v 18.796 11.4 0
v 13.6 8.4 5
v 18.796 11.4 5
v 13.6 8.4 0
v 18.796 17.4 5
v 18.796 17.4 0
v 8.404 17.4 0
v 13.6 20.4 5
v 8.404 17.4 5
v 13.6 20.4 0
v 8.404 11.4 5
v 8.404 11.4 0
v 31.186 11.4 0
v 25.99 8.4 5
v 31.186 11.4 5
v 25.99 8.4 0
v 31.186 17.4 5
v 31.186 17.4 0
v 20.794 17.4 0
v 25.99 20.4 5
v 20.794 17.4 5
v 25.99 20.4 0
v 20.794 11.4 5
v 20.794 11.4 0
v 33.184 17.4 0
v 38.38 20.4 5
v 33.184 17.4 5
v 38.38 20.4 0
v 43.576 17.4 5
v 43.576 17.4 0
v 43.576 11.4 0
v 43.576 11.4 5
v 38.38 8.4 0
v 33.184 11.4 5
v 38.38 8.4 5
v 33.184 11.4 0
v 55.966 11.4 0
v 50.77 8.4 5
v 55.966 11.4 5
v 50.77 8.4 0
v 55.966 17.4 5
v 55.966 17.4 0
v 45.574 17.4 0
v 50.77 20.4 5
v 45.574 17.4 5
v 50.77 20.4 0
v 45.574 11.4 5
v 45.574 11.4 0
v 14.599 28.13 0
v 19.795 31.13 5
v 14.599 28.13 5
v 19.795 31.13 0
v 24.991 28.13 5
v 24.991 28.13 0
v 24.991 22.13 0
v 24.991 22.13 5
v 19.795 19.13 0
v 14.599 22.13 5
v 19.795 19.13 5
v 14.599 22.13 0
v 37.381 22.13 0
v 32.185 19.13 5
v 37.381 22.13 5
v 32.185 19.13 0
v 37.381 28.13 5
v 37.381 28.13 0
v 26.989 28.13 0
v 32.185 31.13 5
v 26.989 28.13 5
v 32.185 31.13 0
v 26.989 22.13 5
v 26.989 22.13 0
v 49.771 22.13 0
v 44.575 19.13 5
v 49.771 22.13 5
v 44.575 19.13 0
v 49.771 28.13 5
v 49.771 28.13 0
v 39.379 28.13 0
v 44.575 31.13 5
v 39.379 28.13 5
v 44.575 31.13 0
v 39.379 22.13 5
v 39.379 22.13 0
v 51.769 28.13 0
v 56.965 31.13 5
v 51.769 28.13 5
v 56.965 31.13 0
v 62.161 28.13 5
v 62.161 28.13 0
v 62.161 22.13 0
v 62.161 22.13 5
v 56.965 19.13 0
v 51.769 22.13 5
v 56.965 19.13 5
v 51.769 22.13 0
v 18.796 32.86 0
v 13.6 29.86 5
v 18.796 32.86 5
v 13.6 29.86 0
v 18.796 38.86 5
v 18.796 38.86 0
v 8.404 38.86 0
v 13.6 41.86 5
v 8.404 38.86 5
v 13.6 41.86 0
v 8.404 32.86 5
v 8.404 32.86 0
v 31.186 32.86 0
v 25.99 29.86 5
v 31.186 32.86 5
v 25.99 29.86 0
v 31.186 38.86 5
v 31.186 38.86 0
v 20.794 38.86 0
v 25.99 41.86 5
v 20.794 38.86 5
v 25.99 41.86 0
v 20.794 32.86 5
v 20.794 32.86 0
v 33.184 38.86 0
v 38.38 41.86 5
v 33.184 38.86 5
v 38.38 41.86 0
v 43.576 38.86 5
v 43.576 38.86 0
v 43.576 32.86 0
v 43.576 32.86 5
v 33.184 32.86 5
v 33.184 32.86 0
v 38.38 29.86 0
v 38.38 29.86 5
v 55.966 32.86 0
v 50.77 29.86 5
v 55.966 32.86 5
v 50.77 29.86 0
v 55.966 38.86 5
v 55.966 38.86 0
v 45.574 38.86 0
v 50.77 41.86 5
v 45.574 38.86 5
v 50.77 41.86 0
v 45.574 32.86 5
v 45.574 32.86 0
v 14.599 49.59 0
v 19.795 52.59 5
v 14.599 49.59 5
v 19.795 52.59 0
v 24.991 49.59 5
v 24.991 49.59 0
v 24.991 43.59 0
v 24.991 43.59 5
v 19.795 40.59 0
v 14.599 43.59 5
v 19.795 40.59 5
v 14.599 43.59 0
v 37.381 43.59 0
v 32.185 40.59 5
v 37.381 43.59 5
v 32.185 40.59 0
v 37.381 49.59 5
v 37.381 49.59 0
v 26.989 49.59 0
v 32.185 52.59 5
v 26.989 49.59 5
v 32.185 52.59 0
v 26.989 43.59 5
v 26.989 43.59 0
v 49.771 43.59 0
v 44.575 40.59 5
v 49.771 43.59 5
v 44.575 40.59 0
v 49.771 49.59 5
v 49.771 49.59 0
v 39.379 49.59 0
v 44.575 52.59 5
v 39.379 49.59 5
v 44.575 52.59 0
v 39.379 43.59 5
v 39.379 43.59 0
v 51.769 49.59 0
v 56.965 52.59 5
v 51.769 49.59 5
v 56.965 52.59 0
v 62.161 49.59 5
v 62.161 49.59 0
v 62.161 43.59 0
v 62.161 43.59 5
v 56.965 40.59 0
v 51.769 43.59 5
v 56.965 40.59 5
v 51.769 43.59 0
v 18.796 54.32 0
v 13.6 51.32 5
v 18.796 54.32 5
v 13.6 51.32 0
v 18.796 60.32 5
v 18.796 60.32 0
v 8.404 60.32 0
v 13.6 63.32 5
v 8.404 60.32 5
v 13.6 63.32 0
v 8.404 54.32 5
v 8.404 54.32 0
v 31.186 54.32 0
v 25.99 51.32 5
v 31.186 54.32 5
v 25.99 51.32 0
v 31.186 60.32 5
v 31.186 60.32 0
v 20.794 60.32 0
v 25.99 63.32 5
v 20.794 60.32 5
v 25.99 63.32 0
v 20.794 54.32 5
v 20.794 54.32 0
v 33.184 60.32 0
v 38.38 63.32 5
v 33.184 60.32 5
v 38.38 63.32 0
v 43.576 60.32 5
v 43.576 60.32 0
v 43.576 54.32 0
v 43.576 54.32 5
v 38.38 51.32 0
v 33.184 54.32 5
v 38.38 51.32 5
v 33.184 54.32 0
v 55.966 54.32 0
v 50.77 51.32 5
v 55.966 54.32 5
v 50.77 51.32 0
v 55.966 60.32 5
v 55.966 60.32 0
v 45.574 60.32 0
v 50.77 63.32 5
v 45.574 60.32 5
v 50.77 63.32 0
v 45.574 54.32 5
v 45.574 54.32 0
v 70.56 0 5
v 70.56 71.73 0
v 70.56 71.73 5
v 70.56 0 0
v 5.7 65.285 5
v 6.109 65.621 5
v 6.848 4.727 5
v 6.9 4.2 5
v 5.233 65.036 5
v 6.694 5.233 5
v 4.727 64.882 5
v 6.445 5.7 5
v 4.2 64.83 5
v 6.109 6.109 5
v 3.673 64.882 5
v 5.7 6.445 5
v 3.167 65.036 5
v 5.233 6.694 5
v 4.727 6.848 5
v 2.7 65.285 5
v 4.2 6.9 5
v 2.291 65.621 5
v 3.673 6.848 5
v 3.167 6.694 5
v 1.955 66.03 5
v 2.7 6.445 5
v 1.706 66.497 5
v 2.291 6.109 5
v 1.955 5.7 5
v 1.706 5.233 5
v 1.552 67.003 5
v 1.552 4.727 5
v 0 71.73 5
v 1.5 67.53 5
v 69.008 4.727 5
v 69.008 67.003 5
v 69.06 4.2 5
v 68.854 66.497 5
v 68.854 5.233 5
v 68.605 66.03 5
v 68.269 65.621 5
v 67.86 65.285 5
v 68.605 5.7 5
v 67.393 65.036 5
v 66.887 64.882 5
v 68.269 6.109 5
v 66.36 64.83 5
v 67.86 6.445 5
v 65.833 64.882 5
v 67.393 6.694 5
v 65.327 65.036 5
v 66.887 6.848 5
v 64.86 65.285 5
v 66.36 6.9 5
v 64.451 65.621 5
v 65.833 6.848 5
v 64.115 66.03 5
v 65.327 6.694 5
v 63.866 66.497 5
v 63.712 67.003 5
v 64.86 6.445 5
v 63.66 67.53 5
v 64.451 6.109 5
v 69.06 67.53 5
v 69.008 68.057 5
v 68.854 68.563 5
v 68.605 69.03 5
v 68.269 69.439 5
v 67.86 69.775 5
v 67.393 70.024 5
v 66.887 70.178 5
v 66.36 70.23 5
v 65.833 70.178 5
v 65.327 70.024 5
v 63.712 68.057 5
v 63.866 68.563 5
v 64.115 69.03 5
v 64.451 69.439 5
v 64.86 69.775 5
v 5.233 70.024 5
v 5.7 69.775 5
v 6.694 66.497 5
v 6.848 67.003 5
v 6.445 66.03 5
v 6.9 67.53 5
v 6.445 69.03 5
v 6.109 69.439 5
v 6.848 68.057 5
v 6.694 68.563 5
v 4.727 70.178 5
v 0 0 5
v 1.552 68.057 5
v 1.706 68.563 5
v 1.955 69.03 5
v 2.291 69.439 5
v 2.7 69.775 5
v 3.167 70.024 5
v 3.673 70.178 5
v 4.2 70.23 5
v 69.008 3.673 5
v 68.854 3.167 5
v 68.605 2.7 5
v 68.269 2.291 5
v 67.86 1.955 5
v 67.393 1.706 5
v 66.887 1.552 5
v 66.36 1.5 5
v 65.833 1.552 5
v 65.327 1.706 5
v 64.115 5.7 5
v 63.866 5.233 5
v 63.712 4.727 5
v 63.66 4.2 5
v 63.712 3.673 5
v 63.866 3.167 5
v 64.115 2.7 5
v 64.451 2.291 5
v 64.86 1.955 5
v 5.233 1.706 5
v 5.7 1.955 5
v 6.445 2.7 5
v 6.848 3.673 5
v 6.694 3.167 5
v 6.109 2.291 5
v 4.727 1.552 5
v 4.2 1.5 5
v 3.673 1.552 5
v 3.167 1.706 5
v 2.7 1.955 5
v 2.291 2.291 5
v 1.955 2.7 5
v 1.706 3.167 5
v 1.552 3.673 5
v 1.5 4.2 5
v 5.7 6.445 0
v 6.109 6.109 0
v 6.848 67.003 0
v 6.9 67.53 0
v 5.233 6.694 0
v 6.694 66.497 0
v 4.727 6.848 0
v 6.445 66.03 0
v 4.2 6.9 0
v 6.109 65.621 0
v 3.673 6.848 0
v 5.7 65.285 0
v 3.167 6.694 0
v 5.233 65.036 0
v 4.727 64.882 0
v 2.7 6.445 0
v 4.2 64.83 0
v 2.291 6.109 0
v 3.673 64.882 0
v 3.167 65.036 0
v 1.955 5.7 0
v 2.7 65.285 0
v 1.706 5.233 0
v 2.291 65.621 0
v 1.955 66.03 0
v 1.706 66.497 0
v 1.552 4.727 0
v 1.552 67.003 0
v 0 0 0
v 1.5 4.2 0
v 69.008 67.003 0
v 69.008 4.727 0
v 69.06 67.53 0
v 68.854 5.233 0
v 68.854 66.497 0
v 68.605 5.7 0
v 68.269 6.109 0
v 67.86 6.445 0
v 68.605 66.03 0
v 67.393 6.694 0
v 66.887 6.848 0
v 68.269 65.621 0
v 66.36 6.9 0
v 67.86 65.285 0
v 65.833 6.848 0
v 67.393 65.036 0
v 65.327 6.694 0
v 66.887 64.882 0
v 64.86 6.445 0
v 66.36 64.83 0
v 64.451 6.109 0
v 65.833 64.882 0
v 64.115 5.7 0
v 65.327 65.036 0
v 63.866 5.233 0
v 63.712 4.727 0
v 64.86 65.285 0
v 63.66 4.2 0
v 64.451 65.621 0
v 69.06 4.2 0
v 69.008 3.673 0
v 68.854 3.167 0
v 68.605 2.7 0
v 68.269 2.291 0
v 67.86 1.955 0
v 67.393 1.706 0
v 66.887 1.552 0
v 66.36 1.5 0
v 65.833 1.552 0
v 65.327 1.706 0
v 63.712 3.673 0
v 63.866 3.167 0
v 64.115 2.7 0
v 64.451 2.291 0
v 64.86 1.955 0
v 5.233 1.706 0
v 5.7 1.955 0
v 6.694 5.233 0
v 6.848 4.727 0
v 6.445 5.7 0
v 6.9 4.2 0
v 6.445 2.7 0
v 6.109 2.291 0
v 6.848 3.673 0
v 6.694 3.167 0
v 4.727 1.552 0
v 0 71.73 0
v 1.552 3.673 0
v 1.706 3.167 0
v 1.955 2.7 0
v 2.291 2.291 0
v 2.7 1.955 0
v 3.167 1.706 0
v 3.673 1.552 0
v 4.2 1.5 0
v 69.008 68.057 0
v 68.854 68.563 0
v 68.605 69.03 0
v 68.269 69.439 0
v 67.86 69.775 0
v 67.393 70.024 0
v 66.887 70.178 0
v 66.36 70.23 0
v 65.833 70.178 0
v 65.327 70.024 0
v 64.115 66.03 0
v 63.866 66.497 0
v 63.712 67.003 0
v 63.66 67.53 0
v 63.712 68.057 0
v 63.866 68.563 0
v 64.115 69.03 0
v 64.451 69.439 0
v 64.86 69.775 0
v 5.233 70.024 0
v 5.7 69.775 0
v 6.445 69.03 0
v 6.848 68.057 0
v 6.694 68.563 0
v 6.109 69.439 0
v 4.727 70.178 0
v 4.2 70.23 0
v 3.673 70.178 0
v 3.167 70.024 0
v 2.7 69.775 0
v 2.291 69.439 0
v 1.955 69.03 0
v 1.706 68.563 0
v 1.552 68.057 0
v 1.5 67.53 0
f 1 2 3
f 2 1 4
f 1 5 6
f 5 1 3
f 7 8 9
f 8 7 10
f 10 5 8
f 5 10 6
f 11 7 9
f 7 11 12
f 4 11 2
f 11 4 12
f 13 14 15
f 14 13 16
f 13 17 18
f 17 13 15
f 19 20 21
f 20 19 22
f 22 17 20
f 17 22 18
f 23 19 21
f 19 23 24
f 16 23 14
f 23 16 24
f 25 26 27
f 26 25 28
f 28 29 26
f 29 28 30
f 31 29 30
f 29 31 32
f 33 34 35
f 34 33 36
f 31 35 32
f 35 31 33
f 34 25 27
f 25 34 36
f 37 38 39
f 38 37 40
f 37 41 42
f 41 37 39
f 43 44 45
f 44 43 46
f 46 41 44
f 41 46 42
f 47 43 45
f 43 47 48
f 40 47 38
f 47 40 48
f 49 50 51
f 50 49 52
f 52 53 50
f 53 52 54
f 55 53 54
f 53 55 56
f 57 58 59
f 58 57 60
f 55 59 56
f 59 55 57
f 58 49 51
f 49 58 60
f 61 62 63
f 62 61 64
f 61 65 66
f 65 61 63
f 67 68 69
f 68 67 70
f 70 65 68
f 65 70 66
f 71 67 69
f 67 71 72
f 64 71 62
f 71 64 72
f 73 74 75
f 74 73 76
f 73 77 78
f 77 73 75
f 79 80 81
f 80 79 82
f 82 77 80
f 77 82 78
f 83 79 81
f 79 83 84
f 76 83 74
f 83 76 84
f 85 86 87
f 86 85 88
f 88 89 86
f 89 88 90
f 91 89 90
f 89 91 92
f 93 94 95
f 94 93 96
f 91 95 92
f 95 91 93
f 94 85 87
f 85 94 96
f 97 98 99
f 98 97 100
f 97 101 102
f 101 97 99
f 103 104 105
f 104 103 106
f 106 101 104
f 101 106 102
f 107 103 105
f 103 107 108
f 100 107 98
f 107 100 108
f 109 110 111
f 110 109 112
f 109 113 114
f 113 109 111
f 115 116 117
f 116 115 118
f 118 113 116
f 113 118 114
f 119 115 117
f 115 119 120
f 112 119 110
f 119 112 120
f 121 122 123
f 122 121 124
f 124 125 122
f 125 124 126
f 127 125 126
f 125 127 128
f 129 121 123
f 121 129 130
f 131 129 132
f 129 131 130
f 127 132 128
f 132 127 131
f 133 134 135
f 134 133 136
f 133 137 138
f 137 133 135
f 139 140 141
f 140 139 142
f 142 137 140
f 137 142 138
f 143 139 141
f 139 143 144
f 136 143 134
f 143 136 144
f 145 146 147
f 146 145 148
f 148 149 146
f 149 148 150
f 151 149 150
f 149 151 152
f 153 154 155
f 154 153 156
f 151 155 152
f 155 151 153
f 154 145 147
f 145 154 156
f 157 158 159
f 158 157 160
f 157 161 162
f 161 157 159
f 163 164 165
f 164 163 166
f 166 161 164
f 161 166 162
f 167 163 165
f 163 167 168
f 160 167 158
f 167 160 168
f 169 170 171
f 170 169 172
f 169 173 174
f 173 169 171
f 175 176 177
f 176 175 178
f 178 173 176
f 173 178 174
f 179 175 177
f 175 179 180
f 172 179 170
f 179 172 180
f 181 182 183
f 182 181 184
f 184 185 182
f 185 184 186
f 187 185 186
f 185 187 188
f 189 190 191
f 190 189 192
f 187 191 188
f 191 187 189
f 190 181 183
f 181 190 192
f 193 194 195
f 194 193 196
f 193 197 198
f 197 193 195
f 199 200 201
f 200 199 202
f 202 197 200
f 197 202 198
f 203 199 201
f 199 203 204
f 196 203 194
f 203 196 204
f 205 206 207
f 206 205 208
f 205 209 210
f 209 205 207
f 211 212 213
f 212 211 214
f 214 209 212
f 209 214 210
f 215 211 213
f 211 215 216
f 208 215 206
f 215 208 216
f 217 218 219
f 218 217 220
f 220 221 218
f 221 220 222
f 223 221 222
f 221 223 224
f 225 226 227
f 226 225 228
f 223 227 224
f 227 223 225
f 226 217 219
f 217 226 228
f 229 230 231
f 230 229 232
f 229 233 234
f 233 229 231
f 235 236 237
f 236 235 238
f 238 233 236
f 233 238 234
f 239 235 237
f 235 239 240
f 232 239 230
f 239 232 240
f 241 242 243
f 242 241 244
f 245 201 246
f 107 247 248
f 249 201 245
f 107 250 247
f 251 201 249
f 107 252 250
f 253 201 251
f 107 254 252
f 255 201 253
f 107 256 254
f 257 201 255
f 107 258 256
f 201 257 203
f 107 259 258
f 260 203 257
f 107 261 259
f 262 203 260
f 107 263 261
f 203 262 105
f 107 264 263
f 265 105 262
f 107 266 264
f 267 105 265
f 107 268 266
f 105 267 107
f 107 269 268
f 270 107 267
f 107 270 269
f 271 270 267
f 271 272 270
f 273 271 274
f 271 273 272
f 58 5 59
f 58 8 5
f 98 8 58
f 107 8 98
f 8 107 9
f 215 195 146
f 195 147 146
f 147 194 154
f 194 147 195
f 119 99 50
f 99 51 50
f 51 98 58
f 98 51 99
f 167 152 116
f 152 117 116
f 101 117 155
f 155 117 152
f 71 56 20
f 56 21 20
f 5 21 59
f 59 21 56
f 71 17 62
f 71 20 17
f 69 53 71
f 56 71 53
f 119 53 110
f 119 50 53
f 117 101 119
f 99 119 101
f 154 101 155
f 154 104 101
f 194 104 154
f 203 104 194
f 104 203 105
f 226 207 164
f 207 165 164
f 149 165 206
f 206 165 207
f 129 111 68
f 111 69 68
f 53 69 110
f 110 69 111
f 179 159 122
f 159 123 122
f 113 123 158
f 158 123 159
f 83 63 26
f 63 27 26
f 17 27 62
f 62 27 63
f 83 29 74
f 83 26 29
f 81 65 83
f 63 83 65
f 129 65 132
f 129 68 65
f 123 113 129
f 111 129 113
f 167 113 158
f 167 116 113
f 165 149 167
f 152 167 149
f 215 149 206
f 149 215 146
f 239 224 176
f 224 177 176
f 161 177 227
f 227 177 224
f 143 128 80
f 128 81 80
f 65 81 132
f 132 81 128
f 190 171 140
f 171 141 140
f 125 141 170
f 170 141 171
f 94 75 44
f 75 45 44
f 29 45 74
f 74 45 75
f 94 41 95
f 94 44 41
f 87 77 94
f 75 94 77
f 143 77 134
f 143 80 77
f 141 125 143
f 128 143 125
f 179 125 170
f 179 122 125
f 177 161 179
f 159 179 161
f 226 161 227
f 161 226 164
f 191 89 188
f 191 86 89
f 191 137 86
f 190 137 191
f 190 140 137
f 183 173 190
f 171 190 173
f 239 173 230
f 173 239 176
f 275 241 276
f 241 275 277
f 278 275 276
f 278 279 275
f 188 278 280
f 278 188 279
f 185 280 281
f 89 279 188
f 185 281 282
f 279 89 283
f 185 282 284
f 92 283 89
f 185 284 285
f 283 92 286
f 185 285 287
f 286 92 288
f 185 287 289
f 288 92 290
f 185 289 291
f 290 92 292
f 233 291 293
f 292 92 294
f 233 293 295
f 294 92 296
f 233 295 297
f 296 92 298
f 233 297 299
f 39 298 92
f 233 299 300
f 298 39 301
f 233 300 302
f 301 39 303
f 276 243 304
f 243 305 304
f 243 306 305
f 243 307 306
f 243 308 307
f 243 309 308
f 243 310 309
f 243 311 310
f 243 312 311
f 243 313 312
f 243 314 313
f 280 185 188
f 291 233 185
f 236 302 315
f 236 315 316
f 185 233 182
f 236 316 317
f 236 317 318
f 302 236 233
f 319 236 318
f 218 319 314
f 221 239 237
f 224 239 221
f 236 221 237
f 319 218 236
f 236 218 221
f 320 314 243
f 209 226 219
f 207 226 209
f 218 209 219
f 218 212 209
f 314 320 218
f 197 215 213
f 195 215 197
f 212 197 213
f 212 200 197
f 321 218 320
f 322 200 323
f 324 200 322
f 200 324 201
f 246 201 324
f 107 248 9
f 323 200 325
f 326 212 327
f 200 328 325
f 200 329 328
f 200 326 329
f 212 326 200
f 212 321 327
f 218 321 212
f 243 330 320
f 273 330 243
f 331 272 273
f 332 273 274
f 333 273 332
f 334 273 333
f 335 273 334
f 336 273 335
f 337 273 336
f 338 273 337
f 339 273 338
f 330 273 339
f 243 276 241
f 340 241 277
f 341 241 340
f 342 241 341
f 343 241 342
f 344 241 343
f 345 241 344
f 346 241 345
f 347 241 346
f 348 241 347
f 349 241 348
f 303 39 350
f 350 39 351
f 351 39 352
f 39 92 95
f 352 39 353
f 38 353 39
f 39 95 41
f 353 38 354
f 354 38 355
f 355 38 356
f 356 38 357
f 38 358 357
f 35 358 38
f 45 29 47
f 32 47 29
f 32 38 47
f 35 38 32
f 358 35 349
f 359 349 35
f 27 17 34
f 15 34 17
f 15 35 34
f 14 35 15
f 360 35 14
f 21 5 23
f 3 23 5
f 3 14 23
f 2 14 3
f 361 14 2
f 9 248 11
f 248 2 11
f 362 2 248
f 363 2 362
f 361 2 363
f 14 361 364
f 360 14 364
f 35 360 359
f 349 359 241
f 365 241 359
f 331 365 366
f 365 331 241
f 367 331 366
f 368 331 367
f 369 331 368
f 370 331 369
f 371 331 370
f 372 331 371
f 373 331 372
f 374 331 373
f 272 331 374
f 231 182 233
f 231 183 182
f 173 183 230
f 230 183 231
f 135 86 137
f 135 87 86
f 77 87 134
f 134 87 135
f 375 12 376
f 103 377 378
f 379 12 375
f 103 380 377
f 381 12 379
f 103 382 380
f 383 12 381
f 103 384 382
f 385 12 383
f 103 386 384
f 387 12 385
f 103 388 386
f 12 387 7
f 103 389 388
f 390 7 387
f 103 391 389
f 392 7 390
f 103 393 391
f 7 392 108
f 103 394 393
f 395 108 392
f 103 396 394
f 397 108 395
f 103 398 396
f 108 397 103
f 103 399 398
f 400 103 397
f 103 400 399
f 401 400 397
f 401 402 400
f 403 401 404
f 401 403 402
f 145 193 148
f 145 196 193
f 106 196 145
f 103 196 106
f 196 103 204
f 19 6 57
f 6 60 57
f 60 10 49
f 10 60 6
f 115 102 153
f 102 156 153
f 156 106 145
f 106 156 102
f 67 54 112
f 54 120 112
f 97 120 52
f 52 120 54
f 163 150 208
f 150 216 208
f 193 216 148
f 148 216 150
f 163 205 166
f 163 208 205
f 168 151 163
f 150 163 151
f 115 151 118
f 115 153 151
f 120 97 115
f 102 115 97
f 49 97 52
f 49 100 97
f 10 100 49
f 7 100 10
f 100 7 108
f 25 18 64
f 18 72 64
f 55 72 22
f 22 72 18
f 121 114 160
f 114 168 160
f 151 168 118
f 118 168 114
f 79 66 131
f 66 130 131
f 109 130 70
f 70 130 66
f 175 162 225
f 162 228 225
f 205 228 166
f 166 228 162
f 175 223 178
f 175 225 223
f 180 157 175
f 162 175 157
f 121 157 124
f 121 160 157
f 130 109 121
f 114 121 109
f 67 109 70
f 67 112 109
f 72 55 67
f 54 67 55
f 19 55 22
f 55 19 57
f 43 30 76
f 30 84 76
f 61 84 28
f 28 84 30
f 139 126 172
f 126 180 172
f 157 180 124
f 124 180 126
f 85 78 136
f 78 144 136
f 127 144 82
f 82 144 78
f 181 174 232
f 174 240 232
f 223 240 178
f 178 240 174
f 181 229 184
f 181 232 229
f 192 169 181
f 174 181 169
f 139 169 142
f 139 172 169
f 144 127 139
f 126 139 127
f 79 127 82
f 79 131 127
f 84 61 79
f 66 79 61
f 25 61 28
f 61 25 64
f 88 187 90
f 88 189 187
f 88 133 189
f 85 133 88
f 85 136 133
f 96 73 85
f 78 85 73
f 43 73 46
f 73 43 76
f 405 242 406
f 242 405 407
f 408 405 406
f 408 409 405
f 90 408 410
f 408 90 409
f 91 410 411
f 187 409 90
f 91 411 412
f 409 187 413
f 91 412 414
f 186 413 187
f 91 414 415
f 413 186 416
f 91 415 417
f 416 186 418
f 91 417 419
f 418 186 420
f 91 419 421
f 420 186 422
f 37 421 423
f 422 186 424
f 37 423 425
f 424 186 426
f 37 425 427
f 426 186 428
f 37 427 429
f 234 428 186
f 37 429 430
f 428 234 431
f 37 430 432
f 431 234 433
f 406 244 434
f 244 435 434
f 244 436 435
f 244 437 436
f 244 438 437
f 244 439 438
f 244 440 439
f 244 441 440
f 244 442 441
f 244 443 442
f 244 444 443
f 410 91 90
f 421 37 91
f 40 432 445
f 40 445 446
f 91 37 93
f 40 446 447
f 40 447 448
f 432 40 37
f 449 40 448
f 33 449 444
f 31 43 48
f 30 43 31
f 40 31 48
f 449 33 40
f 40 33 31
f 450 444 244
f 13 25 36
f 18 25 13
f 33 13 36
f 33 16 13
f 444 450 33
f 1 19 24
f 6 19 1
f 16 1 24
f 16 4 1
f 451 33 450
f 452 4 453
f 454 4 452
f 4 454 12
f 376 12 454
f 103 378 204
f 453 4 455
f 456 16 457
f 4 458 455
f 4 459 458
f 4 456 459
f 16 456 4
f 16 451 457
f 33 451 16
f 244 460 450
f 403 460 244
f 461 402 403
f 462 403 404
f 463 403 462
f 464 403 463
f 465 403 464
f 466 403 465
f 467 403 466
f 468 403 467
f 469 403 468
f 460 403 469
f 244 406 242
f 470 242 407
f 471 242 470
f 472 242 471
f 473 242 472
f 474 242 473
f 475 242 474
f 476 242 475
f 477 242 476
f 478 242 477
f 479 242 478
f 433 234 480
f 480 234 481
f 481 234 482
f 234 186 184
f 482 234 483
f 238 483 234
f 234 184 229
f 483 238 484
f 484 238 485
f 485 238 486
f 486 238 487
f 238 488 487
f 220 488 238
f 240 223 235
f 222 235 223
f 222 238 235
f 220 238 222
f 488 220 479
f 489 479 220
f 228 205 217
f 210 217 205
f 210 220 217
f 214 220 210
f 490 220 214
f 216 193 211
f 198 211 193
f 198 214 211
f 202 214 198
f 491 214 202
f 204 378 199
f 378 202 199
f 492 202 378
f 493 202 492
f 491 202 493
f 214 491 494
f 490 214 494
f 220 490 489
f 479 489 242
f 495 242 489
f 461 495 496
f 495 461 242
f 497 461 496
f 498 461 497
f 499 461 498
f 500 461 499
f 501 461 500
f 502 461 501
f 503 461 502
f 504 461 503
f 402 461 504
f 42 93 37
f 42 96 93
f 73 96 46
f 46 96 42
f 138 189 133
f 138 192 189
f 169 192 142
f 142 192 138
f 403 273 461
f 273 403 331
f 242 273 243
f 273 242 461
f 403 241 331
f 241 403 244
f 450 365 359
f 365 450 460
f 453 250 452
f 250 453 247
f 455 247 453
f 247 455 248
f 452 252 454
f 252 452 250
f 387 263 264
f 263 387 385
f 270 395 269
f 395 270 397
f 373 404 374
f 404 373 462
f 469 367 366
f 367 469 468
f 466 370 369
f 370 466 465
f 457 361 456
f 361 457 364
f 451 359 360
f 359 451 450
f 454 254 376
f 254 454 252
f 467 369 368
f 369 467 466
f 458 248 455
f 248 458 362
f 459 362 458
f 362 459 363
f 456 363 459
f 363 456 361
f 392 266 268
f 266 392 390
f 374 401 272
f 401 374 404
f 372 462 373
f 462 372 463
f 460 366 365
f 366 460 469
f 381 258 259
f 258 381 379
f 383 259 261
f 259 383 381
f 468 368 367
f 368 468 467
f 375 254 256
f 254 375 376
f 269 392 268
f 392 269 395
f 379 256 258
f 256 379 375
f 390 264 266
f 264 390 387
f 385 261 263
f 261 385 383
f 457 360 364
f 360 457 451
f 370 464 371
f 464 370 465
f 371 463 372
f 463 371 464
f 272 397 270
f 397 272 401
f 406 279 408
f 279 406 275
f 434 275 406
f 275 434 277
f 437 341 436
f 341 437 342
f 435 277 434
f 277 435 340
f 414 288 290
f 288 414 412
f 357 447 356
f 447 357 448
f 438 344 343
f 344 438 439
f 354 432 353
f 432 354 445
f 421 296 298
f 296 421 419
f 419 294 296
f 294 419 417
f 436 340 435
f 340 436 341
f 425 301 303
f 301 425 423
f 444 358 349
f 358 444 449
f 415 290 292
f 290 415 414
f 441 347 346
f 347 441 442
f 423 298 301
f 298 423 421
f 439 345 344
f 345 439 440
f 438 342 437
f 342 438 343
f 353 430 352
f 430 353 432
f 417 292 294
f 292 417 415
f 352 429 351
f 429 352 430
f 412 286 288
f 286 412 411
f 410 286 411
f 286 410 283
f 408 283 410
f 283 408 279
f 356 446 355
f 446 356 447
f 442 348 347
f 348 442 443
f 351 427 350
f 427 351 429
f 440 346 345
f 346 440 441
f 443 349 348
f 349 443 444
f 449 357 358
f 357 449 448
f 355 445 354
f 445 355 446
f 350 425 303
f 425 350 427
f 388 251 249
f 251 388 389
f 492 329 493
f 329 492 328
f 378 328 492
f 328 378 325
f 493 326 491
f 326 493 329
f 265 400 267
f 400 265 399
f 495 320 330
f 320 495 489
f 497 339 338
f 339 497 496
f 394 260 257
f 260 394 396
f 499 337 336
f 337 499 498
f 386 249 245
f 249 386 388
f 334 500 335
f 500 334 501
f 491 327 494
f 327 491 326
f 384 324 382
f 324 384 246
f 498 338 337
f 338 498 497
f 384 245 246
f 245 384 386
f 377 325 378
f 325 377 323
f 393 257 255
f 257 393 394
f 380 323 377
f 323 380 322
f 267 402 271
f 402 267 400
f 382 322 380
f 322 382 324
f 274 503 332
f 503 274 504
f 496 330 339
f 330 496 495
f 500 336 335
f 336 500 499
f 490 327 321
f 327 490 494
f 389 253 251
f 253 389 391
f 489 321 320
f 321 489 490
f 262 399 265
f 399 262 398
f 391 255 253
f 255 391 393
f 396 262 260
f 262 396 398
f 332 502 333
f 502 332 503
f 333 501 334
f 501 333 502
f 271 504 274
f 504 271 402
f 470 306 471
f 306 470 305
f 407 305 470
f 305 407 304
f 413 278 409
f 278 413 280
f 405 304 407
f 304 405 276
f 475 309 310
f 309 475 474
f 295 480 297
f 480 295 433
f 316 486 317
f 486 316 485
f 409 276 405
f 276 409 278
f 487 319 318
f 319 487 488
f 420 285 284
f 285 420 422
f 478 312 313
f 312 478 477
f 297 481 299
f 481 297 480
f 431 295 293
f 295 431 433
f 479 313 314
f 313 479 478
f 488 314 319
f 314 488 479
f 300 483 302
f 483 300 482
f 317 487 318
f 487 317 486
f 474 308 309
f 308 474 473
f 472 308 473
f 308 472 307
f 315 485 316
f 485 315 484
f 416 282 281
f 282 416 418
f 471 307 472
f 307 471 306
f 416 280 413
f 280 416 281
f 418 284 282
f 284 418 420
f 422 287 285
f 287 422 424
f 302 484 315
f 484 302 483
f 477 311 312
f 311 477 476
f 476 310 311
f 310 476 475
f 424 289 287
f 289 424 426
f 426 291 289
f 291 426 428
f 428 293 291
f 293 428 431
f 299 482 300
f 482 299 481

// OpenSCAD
$fn = 32;

// ----------------------------------------------------------------------
// Honeycomb panel: 70.56 x 71.73 mm, 20 cells of 12 mm
// ----------------------------------------------------------------------

// --- parameters (mm) ---
panel_w = 70.56;          // panel width
panel_d = 71.73;          // panel depth
thick = 5;                // panel thickness
cell_r = 6;               // hex cell circumradius
pitch = 12.39;            // hex cell pitch (centre to centre)
web = 2;                  // web between the cells
columns = 4;              // columns of cells
rows = 5;                 // rows of cells
cell_count = 20;          // total cells
shift_x = 13.6;           // first cell offset in x
shift_y = 14.4;           // first cell offset in y
mount_d = 5.4;            // corner mounting holes
hole_off = 4.2;           // mounting hole offset from the corners

difference() {
  union() {
    cube([panel_w, panel_d, thick]);
  }
  /* hexagonal cells, point-up, cut right through the plate */
  for (row = [0 : rows - 1]) {
    for (col = [0 : columns - 1]) {
      translate([shift_x + col * pitch + (row % 2) * pitch / 2, shift_y + row * pitch * 0.866025, -2.5]) rotate([0, 0, 30]) cylinder(h = thick + 5, d = 2 * cell_r, $fn = 6);
    }
  }
  /* corner mounting holes, clear of the outer cell web */
  translate([4.2, 4.2, -2.5]) cylinder(h = thick + 5, d = mount_d);
  translate([66.36, 4.2, -2.5]) cylinder(h = thick + 5, d = mount_d);
  translate([4.2, 67.53, -2.5]) cylinder(h = thick + 5, d = mount_d);
  translate([66.36, 67.53, -2.5]) cylinder(h = thick + 5, d = mount_d);
}
